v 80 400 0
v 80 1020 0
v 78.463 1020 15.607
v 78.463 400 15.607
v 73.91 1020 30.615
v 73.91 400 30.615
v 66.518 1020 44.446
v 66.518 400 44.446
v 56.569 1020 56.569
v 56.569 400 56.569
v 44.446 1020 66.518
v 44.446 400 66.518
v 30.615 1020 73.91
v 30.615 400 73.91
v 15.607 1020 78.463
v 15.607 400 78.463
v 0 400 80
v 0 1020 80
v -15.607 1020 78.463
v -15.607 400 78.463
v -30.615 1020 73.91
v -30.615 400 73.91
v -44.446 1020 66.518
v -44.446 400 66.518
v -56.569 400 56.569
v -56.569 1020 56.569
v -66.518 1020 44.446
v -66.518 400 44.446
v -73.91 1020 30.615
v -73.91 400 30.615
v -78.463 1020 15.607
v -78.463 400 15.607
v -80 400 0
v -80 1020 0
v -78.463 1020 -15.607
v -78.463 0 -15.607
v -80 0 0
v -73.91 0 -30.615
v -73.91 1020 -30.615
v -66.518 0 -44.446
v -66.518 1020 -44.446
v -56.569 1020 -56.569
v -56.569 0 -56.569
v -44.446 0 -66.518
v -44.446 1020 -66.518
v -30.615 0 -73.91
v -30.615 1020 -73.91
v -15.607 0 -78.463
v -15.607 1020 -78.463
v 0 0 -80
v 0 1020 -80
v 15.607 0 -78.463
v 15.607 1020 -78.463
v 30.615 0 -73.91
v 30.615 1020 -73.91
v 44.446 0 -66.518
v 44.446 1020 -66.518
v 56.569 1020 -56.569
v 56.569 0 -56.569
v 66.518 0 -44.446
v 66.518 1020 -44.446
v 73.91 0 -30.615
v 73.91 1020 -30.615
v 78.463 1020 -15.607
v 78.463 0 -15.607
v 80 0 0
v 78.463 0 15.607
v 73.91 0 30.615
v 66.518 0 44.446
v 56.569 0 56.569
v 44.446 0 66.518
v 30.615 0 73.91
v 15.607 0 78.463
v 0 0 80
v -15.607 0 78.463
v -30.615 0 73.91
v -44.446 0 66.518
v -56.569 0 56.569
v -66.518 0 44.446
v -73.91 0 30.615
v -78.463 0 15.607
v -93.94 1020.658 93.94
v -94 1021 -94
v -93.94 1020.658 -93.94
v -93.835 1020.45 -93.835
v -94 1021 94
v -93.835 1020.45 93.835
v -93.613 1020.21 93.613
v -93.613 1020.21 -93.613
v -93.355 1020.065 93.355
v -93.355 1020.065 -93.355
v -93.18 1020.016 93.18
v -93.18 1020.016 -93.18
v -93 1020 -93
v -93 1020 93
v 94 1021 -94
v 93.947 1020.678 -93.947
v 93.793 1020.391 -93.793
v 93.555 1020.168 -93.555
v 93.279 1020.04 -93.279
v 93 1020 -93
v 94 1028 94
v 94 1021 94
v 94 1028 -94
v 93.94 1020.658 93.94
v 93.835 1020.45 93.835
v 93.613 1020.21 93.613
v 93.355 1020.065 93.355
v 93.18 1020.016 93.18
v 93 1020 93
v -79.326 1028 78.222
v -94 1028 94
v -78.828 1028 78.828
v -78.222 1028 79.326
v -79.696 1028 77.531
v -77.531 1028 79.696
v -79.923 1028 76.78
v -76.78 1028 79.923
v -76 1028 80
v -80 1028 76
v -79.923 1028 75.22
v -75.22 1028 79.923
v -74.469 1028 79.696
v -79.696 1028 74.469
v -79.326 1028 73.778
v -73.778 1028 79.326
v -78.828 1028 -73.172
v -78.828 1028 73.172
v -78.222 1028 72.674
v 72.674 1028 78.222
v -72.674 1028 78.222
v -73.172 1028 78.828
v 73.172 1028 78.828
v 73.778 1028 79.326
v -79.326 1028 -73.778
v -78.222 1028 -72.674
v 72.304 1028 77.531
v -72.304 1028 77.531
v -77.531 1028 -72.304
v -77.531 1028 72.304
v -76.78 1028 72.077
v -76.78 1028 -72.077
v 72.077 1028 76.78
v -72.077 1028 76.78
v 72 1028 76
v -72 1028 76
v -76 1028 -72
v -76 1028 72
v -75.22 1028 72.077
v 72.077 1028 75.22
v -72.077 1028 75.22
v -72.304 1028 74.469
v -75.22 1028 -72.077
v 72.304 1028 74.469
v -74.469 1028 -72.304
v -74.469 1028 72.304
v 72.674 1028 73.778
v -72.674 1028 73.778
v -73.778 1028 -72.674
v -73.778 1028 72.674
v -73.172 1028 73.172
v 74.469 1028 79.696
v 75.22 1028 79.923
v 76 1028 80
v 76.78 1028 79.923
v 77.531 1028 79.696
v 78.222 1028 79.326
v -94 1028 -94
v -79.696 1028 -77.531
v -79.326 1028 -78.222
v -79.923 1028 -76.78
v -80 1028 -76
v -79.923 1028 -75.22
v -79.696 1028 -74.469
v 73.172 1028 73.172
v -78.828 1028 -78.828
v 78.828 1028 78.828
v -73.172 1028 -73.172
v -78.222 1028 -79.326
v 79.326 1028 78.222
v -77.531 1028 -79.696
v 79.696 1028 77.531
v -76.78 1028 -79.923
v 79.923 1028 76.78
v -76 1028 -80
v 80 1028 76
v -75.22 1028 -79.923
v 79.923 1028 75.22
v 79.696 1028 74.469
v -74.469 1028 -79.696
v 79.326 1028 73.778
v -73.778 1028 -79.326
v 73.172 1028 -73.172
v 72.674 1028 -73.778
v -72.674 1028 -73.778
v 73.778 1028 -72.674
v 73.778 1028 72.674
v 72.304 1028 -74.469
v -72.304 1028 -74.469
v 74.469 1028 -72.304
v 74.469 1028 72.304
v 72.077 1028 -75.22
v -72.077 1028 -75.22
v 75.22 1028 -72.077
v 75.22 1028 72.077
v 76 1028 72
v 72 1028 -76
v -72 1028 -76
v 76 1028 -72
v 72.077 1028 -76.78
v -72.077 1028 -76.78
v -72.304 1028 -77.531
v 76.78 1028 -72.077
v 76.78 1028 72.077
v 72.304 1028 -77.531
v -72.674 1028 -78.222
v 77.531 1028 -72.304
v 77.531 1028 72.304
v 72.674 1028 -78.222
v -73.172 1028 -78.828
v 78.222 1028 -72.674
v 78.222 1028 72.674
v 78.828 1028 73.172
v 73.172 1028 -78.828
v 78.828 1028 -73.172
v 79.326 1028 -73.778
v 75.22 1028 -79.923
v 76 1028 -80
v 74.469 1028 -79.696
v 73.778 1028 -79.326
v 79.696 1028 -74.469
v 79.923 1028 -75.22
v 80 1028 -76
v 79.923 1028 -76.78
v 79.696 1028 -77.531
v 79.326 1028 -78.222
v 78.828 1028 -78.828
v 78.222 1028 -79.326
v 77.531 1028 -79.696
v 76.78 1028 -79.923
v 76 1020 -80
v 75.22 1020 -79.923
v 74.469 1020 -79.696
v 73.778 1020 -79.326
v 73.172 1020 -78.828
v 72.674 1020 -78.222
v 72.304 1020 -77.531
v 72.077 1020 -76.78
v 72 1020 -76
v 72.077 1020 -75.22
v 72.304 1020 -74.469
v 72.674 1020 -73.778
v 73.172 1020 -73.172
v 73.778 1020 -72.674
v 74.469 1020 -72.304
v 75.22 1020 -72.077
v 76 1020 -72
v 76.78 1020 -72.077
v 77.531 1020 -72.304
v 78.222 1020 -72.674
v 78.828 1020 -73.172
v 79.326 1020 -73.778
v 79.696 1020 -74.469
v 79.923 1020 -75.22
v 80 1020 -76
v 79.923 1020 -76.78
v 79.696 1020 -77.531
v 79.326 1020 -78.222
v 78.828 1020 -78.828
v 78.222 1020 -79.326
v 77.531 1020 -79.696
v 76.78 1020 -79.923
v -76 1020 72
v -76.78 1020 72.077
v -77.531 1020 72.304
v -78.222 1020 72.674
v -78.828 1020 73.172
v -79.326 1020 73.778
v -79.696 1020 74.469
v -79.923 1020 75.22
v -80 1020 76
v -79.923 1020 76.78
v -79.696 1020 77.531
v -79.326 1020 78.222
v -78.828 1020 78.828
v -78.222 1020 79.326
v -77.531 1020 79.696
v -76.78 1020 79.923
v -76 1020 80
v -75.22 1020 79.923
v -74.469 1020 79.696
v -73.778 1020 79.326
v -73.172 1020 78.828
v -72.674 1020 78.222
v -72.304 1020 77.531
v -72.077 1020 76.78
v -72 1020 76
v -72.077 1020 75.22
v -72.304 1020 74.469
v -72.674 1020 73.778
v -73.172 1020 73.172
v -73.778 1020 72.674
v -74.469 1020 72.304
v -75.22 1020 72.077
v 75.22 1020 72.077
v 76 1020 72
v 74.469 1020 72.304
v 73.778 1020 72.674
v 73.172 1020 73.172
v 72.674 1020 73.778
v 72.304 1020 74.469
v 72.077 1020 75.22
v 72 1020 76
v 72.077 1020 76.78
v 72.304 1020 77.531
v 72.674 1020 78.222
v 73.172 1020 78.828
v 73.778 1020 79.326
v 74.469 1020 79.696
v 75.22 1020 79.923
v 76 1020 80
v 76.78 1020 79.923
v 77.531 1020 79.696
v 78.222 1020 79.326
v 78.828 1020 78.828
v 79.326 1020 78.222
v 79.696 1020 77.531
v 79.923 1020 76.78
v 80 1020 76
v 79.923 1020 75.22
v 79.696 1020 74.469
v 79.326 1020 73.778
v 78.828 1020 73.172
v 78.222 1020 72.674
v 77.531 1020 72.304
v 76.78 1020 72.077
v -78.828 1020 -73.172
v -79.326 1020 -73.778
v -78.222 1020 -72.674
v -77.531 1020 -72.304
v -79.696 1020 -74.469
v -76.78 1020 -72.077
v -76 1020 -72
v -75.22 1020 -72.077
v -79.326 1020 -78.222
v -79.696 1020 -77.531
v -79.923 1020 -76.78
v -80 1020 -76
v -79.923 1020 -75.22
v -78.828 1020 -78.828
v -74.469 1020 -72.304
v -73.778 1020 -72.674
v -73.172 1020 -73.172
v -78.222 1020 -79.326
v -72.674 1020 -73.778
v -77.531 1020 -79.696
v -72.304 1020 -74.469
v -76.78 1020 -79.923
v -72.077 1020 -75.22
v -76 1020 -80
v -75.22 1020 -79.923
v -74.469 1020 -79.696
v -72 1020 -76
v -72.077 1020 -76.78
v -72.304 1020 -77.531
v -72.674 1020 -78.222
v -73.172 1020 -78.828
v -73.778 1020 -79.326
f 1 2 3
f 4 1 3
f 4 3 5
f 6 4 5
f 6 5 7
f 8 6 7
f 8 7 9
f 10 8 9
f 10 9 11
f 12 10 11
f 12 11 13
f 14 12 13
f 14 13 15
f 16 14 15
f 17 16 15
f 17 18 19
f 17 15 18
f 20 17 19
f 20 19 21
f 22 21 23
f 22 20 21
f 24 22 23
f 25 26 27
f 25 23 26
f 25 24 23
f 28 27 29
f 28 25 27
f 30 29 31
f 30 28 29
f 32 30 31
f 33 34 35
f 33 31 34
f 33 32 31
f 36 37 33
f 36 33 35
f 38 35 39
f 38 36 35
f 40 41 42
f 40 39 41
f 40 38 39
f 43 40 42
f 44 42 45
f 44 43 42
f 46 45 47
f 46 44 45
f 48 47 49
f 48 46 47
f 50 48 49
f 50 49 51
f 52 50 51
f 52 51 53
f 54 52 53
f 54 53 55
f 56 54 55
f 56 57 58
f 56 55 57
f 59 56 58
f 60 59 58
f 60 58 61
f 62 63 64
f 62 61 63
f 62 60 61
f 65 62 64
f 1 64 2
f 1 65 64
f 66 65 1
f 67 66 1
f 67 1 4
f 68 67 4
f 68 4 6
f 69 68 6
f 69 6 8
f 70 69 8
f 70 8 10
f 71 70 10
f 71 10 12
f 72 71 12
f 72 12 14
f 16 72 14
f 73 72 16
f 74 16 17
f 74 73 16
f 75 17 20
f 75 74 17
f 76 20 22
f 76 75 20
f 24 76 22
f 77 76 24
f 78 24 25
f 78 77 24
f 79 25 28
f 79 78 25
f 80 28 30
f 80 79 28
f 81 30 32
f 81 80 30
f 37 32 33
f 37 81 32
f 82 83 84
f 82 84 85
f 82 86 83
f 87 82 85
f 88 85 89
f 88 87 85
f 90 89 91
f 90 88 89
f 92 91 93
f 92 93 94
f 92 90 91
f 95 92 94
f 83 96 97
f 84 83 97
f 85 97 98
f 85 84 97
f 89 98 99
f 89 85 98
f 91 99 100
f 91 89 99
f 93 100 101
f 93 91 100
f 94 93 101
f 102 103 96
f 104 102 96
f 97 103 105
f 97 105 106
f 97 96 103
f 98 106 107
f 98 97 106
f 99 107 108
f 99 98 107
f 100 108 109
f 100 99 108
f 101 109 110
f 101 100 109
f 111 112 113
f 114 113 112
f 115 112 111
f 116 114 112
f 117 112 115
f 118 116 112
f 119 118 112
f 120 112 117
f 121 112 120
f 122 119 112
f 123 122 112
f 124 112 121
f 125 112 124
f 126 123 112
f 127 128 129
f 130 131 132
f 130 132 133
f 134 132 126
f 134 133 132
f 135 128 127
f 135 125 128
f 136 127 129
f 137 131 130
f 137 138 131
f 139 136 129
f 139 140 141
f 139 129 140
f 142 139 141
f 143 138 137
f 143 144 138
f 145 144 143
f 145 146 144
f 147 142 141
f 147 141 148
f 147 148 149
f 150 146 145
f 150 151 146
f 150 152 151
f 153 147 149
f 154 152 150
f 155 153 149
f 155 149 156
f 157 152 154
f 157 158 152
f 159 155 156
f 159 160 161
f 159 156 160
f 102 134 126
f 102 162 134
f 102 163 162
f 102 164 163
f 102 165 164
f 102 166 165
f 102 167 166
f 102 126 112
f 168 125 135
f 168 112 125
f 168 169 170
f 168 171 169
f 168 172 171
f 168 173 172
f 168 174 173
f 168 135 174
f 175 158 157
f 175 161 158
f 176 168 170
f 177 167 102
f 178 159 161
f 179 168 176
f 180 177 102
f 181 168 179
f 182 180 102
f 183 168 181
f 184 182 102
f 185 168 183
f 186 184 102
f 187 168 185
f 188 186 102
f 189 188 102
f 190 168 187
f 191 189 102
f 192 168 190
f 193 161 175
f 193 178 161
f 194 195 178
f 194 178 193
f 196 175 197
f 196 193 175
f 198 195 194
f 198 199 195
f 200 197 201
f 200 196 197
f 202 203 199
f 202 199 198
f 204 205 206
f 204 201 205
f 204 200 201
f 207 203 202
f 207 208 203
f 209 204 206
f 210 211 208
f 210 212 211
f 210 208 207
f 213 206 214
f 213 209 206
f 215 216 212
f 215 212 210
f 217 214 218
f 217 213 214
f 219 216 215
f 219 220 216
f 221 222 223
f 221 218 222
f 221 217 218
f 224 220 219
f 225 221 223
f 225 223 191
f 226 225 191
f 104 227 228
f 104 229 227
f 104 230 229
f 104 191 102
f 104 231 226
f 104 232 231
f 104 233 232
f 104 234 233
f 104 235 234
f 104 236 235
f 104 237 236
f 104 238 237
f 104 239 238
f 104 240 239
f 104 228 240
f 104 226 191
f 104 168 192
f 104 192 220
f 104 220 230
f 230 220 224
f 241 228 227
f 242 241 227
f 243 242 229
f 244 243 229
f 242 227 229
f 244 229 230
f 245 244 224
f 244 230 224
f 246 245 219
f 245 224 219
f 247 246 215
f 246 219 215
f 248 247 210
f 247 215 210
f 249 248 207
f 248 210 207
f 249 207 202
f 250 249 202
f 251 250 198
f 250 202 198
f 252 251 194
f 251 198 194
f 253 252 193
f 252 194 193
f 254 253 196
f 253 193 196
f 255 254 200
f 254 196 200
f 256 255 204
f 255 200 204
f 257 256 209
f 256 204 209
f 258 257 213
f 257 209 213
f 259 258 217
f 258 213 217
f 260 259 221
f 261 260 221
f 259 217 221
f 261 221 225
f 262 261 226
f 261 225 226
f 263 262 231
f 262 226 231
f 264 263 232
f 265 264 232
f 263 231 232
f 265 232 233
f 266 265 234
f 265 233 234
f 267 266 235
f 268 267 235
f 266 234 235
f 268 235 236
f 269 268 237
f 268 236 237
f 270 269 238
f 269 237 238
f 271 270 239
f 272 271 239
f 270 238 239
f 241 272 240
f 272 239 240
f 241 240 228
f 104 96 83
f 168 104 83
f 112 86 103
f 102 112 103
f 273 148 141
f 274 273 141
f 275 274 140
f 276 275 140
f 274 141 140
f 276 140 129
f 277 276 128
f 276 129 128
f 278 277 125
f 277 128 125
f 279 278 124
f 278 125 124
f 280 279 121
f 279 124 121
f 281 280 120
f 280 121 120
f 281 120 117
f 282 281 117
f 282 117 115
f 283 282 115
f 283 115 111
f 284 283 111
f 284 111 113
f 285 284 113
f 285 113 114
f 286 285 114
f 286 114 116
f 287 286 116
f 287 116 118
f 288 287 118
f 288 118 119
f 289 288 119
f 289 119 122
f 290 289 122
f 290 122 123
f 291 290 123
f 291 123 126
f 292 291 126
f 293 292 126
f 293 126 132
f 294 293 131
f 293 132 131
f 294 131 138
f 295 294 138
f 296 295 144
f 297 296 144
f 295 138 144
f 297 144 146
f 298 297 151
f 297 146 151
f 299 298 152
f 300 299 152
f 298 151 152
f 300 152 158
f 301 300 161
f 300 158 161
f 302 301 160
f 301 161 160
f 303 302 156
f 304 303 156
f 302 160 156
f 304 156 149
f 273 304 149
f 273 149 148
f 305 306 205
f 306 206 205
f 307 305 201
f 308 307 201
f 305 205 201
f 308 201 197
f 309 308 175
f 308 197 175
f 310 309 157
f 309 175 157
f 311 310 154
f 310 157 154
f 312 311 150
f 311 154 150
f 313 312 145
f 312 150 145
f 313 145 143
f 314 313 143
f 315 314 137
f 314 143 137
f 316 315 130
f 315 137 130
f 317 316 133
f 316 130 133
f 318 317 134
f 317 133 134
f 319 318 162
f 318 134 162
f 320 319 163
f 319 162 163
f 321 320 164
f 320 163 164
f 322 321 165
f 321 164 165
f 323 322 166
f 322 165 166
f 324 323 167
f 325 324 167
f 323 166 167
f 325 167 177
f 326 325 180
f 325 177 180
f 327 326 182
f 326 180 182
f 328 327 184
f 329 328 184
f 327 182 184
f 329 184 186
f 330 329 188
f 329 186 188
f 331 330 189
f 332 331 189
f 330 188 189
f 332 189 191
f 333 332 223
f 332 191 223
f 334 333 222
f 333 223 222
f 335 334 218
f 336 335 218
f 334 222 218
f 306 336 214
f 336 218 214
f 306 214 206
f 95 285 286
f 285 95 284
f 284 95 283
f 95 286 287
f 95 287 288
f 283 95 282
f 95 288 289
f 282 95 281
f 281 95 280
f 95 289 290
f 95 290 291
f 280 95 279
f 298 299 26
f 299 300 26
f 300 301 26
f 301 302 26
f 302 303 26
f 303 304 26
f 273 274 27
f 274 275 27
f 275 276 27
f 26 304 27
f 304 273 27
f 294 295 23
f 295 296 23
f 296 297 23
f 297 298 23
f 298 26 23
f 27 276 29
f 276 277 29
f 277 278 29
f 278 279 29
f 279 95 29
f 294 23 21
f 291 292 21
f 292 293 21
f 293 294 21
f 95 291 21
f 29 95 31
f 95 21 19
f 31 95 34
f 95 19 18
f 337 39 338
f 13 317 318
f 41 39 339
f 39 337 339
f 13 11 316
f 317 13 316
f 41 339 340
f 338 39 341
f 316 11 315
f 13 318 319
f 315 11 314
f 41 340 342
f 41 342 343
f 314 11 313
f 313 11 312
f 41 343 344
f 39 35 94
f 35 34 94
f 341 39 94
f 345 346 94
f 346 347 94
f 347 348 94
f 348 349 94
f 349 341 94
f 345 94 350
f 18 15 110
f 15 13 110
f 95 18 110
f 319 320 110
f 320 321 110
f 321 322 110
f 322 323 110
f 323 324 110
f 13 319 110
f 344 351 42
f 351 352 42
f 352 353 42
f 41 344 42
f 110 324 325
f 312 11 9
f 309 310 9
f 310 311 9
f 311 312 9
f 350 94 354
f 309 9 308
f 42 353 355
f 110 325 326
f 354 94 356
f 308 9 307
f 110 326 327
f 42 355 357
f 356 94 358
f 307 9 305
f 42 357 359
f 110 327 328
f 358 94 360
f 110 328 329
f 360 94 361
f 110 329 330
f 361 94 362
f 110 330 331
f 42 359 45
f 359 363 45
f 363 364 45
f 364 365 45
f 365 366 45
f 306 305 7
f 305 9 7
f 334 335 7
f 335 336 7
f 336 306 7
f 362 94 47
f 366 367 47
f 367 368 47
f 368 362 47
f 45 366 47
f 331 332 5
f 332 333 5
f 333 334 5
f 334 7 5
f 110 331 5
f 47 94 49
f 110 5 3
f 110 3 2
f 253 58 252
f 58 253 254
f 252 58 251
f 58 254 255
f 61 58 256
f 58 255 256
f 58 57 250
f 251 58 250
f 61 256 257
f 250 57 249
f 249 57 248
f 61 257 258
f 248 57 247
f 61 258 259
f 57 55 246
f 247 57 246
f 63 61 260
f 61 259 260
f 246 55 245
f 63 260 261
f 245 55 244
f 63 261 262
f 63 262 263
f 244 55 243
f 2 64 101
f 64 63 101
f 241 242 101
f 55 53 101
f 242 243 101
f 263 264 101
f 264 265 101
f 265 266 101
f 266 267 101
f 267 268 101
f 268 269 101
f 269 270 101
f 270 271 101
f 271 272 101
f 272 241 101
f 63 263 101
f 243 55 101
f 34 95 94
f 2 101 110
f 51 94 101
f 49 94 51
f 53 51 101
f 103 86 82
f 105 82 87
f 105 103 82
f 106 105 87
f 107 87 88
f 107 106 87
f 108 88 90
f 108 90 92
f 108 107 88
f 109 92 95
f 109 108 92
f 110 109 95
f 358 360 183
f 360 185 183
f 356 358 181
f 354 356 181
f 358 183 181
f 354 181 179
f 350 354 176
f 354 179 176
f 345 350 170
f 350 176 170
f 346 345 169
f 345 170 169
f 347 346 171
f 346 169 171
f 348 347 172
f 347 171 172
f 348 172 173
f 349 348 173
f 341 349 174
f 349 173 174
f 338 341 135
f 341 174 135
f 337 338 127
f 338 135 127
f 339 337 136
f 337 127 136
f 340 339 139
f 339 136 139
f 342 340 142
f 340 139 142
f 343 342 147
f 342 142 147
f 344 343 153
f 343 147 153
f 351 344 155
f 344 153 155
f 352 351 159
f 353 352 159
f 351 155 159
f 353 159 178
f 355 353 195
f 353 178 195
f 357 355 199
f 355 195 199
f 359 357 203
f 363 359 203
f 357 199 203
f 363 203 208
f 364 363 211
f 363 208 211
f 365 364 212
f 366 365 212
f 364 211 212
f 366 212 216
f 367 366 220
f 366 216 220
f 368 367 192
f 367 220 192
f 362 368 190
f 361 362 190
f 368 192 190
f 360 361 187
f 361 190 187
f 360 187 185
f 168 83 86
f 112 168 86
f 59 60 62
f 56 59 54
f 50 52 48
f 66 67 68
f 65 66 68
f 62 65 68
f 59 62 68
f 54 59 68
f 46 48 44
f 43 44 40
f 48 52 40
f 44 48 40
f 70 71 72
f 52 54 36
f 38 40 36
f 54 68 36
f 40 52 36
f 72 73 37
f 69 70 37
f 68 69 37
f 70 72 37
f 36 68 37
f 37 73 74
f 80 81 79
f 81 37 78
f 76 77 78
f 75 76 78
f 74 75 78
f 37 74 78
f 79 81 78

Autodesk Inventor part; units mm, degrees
ref_plane "YZ Plane" through (0, 0, 0) normal (1, 0, 0) x (0, 1, 0)
ref_plane "XZ Plane" through (0, 0, 0) normal (0, 1, 0) x (-1, 0, 0)
sketch "Sketch1" plane through (0, 0, 0) normal (0, 1, 0) x (-1, 0, 0)
  circle A0 centre (0, 0) radius 80
extrude "InBase" add sketch "Sketch1" along normal blind 400
sketch "Sketch2" plane through (0, 400, 0) normal (0, 1, 0) x (1, 0, 0)
  circle A0 centre (0, 0) radius 80
extrude "AboveBase" add sketch "Sketch2" along normal blind 620
ref_plane "PlateWorkPlane" through (0, 1020, 0) normal (0, 1, 0) x (1, 0, 0)
sketch "Sketch3" plane through (0, 1020, 0) normal (0, 1, 0) x (1, 0, 0)
  line L0 (-94, -94) -> (94, -94)
  line L1 (94, -94) -> (94, 94)
  line L2 (94, 94) -> (-94, 94)
  line L3 (-94, 94) -> (-94, -94)
  line L4 (-94, -94) -> (94, 94) construction
  line L5 (94, -94) -> (-94, 94) construction
  point P0 (0, 0)
extrude "ConnectorPlate" add sketch "Sketch3" along normal blind 8
sketch "Sketch4" plane through (0, 1020, 0) normal (0, -1, 0) x (1, 0, 0)
  point P0 (0, 0)
  point P1 (-76, -76)
  point P2 (-76, 76)
  point P3 (76, 76)
  point P4 (76, -76)
hole "BoltHoles" at (-76, 1020, 76) at (76, 1020, 76) at (76, 1020, -76) at (-76, 1020, -76) direction (0, 1, 0) diameter 8 end through all
fillet "Fillet1" radius 1 4 edges at (0, 1020, 94) (94, 1020, 0) (-94, 1020, 0) (0, 1020, -94)
properties part number "RaAxis"
